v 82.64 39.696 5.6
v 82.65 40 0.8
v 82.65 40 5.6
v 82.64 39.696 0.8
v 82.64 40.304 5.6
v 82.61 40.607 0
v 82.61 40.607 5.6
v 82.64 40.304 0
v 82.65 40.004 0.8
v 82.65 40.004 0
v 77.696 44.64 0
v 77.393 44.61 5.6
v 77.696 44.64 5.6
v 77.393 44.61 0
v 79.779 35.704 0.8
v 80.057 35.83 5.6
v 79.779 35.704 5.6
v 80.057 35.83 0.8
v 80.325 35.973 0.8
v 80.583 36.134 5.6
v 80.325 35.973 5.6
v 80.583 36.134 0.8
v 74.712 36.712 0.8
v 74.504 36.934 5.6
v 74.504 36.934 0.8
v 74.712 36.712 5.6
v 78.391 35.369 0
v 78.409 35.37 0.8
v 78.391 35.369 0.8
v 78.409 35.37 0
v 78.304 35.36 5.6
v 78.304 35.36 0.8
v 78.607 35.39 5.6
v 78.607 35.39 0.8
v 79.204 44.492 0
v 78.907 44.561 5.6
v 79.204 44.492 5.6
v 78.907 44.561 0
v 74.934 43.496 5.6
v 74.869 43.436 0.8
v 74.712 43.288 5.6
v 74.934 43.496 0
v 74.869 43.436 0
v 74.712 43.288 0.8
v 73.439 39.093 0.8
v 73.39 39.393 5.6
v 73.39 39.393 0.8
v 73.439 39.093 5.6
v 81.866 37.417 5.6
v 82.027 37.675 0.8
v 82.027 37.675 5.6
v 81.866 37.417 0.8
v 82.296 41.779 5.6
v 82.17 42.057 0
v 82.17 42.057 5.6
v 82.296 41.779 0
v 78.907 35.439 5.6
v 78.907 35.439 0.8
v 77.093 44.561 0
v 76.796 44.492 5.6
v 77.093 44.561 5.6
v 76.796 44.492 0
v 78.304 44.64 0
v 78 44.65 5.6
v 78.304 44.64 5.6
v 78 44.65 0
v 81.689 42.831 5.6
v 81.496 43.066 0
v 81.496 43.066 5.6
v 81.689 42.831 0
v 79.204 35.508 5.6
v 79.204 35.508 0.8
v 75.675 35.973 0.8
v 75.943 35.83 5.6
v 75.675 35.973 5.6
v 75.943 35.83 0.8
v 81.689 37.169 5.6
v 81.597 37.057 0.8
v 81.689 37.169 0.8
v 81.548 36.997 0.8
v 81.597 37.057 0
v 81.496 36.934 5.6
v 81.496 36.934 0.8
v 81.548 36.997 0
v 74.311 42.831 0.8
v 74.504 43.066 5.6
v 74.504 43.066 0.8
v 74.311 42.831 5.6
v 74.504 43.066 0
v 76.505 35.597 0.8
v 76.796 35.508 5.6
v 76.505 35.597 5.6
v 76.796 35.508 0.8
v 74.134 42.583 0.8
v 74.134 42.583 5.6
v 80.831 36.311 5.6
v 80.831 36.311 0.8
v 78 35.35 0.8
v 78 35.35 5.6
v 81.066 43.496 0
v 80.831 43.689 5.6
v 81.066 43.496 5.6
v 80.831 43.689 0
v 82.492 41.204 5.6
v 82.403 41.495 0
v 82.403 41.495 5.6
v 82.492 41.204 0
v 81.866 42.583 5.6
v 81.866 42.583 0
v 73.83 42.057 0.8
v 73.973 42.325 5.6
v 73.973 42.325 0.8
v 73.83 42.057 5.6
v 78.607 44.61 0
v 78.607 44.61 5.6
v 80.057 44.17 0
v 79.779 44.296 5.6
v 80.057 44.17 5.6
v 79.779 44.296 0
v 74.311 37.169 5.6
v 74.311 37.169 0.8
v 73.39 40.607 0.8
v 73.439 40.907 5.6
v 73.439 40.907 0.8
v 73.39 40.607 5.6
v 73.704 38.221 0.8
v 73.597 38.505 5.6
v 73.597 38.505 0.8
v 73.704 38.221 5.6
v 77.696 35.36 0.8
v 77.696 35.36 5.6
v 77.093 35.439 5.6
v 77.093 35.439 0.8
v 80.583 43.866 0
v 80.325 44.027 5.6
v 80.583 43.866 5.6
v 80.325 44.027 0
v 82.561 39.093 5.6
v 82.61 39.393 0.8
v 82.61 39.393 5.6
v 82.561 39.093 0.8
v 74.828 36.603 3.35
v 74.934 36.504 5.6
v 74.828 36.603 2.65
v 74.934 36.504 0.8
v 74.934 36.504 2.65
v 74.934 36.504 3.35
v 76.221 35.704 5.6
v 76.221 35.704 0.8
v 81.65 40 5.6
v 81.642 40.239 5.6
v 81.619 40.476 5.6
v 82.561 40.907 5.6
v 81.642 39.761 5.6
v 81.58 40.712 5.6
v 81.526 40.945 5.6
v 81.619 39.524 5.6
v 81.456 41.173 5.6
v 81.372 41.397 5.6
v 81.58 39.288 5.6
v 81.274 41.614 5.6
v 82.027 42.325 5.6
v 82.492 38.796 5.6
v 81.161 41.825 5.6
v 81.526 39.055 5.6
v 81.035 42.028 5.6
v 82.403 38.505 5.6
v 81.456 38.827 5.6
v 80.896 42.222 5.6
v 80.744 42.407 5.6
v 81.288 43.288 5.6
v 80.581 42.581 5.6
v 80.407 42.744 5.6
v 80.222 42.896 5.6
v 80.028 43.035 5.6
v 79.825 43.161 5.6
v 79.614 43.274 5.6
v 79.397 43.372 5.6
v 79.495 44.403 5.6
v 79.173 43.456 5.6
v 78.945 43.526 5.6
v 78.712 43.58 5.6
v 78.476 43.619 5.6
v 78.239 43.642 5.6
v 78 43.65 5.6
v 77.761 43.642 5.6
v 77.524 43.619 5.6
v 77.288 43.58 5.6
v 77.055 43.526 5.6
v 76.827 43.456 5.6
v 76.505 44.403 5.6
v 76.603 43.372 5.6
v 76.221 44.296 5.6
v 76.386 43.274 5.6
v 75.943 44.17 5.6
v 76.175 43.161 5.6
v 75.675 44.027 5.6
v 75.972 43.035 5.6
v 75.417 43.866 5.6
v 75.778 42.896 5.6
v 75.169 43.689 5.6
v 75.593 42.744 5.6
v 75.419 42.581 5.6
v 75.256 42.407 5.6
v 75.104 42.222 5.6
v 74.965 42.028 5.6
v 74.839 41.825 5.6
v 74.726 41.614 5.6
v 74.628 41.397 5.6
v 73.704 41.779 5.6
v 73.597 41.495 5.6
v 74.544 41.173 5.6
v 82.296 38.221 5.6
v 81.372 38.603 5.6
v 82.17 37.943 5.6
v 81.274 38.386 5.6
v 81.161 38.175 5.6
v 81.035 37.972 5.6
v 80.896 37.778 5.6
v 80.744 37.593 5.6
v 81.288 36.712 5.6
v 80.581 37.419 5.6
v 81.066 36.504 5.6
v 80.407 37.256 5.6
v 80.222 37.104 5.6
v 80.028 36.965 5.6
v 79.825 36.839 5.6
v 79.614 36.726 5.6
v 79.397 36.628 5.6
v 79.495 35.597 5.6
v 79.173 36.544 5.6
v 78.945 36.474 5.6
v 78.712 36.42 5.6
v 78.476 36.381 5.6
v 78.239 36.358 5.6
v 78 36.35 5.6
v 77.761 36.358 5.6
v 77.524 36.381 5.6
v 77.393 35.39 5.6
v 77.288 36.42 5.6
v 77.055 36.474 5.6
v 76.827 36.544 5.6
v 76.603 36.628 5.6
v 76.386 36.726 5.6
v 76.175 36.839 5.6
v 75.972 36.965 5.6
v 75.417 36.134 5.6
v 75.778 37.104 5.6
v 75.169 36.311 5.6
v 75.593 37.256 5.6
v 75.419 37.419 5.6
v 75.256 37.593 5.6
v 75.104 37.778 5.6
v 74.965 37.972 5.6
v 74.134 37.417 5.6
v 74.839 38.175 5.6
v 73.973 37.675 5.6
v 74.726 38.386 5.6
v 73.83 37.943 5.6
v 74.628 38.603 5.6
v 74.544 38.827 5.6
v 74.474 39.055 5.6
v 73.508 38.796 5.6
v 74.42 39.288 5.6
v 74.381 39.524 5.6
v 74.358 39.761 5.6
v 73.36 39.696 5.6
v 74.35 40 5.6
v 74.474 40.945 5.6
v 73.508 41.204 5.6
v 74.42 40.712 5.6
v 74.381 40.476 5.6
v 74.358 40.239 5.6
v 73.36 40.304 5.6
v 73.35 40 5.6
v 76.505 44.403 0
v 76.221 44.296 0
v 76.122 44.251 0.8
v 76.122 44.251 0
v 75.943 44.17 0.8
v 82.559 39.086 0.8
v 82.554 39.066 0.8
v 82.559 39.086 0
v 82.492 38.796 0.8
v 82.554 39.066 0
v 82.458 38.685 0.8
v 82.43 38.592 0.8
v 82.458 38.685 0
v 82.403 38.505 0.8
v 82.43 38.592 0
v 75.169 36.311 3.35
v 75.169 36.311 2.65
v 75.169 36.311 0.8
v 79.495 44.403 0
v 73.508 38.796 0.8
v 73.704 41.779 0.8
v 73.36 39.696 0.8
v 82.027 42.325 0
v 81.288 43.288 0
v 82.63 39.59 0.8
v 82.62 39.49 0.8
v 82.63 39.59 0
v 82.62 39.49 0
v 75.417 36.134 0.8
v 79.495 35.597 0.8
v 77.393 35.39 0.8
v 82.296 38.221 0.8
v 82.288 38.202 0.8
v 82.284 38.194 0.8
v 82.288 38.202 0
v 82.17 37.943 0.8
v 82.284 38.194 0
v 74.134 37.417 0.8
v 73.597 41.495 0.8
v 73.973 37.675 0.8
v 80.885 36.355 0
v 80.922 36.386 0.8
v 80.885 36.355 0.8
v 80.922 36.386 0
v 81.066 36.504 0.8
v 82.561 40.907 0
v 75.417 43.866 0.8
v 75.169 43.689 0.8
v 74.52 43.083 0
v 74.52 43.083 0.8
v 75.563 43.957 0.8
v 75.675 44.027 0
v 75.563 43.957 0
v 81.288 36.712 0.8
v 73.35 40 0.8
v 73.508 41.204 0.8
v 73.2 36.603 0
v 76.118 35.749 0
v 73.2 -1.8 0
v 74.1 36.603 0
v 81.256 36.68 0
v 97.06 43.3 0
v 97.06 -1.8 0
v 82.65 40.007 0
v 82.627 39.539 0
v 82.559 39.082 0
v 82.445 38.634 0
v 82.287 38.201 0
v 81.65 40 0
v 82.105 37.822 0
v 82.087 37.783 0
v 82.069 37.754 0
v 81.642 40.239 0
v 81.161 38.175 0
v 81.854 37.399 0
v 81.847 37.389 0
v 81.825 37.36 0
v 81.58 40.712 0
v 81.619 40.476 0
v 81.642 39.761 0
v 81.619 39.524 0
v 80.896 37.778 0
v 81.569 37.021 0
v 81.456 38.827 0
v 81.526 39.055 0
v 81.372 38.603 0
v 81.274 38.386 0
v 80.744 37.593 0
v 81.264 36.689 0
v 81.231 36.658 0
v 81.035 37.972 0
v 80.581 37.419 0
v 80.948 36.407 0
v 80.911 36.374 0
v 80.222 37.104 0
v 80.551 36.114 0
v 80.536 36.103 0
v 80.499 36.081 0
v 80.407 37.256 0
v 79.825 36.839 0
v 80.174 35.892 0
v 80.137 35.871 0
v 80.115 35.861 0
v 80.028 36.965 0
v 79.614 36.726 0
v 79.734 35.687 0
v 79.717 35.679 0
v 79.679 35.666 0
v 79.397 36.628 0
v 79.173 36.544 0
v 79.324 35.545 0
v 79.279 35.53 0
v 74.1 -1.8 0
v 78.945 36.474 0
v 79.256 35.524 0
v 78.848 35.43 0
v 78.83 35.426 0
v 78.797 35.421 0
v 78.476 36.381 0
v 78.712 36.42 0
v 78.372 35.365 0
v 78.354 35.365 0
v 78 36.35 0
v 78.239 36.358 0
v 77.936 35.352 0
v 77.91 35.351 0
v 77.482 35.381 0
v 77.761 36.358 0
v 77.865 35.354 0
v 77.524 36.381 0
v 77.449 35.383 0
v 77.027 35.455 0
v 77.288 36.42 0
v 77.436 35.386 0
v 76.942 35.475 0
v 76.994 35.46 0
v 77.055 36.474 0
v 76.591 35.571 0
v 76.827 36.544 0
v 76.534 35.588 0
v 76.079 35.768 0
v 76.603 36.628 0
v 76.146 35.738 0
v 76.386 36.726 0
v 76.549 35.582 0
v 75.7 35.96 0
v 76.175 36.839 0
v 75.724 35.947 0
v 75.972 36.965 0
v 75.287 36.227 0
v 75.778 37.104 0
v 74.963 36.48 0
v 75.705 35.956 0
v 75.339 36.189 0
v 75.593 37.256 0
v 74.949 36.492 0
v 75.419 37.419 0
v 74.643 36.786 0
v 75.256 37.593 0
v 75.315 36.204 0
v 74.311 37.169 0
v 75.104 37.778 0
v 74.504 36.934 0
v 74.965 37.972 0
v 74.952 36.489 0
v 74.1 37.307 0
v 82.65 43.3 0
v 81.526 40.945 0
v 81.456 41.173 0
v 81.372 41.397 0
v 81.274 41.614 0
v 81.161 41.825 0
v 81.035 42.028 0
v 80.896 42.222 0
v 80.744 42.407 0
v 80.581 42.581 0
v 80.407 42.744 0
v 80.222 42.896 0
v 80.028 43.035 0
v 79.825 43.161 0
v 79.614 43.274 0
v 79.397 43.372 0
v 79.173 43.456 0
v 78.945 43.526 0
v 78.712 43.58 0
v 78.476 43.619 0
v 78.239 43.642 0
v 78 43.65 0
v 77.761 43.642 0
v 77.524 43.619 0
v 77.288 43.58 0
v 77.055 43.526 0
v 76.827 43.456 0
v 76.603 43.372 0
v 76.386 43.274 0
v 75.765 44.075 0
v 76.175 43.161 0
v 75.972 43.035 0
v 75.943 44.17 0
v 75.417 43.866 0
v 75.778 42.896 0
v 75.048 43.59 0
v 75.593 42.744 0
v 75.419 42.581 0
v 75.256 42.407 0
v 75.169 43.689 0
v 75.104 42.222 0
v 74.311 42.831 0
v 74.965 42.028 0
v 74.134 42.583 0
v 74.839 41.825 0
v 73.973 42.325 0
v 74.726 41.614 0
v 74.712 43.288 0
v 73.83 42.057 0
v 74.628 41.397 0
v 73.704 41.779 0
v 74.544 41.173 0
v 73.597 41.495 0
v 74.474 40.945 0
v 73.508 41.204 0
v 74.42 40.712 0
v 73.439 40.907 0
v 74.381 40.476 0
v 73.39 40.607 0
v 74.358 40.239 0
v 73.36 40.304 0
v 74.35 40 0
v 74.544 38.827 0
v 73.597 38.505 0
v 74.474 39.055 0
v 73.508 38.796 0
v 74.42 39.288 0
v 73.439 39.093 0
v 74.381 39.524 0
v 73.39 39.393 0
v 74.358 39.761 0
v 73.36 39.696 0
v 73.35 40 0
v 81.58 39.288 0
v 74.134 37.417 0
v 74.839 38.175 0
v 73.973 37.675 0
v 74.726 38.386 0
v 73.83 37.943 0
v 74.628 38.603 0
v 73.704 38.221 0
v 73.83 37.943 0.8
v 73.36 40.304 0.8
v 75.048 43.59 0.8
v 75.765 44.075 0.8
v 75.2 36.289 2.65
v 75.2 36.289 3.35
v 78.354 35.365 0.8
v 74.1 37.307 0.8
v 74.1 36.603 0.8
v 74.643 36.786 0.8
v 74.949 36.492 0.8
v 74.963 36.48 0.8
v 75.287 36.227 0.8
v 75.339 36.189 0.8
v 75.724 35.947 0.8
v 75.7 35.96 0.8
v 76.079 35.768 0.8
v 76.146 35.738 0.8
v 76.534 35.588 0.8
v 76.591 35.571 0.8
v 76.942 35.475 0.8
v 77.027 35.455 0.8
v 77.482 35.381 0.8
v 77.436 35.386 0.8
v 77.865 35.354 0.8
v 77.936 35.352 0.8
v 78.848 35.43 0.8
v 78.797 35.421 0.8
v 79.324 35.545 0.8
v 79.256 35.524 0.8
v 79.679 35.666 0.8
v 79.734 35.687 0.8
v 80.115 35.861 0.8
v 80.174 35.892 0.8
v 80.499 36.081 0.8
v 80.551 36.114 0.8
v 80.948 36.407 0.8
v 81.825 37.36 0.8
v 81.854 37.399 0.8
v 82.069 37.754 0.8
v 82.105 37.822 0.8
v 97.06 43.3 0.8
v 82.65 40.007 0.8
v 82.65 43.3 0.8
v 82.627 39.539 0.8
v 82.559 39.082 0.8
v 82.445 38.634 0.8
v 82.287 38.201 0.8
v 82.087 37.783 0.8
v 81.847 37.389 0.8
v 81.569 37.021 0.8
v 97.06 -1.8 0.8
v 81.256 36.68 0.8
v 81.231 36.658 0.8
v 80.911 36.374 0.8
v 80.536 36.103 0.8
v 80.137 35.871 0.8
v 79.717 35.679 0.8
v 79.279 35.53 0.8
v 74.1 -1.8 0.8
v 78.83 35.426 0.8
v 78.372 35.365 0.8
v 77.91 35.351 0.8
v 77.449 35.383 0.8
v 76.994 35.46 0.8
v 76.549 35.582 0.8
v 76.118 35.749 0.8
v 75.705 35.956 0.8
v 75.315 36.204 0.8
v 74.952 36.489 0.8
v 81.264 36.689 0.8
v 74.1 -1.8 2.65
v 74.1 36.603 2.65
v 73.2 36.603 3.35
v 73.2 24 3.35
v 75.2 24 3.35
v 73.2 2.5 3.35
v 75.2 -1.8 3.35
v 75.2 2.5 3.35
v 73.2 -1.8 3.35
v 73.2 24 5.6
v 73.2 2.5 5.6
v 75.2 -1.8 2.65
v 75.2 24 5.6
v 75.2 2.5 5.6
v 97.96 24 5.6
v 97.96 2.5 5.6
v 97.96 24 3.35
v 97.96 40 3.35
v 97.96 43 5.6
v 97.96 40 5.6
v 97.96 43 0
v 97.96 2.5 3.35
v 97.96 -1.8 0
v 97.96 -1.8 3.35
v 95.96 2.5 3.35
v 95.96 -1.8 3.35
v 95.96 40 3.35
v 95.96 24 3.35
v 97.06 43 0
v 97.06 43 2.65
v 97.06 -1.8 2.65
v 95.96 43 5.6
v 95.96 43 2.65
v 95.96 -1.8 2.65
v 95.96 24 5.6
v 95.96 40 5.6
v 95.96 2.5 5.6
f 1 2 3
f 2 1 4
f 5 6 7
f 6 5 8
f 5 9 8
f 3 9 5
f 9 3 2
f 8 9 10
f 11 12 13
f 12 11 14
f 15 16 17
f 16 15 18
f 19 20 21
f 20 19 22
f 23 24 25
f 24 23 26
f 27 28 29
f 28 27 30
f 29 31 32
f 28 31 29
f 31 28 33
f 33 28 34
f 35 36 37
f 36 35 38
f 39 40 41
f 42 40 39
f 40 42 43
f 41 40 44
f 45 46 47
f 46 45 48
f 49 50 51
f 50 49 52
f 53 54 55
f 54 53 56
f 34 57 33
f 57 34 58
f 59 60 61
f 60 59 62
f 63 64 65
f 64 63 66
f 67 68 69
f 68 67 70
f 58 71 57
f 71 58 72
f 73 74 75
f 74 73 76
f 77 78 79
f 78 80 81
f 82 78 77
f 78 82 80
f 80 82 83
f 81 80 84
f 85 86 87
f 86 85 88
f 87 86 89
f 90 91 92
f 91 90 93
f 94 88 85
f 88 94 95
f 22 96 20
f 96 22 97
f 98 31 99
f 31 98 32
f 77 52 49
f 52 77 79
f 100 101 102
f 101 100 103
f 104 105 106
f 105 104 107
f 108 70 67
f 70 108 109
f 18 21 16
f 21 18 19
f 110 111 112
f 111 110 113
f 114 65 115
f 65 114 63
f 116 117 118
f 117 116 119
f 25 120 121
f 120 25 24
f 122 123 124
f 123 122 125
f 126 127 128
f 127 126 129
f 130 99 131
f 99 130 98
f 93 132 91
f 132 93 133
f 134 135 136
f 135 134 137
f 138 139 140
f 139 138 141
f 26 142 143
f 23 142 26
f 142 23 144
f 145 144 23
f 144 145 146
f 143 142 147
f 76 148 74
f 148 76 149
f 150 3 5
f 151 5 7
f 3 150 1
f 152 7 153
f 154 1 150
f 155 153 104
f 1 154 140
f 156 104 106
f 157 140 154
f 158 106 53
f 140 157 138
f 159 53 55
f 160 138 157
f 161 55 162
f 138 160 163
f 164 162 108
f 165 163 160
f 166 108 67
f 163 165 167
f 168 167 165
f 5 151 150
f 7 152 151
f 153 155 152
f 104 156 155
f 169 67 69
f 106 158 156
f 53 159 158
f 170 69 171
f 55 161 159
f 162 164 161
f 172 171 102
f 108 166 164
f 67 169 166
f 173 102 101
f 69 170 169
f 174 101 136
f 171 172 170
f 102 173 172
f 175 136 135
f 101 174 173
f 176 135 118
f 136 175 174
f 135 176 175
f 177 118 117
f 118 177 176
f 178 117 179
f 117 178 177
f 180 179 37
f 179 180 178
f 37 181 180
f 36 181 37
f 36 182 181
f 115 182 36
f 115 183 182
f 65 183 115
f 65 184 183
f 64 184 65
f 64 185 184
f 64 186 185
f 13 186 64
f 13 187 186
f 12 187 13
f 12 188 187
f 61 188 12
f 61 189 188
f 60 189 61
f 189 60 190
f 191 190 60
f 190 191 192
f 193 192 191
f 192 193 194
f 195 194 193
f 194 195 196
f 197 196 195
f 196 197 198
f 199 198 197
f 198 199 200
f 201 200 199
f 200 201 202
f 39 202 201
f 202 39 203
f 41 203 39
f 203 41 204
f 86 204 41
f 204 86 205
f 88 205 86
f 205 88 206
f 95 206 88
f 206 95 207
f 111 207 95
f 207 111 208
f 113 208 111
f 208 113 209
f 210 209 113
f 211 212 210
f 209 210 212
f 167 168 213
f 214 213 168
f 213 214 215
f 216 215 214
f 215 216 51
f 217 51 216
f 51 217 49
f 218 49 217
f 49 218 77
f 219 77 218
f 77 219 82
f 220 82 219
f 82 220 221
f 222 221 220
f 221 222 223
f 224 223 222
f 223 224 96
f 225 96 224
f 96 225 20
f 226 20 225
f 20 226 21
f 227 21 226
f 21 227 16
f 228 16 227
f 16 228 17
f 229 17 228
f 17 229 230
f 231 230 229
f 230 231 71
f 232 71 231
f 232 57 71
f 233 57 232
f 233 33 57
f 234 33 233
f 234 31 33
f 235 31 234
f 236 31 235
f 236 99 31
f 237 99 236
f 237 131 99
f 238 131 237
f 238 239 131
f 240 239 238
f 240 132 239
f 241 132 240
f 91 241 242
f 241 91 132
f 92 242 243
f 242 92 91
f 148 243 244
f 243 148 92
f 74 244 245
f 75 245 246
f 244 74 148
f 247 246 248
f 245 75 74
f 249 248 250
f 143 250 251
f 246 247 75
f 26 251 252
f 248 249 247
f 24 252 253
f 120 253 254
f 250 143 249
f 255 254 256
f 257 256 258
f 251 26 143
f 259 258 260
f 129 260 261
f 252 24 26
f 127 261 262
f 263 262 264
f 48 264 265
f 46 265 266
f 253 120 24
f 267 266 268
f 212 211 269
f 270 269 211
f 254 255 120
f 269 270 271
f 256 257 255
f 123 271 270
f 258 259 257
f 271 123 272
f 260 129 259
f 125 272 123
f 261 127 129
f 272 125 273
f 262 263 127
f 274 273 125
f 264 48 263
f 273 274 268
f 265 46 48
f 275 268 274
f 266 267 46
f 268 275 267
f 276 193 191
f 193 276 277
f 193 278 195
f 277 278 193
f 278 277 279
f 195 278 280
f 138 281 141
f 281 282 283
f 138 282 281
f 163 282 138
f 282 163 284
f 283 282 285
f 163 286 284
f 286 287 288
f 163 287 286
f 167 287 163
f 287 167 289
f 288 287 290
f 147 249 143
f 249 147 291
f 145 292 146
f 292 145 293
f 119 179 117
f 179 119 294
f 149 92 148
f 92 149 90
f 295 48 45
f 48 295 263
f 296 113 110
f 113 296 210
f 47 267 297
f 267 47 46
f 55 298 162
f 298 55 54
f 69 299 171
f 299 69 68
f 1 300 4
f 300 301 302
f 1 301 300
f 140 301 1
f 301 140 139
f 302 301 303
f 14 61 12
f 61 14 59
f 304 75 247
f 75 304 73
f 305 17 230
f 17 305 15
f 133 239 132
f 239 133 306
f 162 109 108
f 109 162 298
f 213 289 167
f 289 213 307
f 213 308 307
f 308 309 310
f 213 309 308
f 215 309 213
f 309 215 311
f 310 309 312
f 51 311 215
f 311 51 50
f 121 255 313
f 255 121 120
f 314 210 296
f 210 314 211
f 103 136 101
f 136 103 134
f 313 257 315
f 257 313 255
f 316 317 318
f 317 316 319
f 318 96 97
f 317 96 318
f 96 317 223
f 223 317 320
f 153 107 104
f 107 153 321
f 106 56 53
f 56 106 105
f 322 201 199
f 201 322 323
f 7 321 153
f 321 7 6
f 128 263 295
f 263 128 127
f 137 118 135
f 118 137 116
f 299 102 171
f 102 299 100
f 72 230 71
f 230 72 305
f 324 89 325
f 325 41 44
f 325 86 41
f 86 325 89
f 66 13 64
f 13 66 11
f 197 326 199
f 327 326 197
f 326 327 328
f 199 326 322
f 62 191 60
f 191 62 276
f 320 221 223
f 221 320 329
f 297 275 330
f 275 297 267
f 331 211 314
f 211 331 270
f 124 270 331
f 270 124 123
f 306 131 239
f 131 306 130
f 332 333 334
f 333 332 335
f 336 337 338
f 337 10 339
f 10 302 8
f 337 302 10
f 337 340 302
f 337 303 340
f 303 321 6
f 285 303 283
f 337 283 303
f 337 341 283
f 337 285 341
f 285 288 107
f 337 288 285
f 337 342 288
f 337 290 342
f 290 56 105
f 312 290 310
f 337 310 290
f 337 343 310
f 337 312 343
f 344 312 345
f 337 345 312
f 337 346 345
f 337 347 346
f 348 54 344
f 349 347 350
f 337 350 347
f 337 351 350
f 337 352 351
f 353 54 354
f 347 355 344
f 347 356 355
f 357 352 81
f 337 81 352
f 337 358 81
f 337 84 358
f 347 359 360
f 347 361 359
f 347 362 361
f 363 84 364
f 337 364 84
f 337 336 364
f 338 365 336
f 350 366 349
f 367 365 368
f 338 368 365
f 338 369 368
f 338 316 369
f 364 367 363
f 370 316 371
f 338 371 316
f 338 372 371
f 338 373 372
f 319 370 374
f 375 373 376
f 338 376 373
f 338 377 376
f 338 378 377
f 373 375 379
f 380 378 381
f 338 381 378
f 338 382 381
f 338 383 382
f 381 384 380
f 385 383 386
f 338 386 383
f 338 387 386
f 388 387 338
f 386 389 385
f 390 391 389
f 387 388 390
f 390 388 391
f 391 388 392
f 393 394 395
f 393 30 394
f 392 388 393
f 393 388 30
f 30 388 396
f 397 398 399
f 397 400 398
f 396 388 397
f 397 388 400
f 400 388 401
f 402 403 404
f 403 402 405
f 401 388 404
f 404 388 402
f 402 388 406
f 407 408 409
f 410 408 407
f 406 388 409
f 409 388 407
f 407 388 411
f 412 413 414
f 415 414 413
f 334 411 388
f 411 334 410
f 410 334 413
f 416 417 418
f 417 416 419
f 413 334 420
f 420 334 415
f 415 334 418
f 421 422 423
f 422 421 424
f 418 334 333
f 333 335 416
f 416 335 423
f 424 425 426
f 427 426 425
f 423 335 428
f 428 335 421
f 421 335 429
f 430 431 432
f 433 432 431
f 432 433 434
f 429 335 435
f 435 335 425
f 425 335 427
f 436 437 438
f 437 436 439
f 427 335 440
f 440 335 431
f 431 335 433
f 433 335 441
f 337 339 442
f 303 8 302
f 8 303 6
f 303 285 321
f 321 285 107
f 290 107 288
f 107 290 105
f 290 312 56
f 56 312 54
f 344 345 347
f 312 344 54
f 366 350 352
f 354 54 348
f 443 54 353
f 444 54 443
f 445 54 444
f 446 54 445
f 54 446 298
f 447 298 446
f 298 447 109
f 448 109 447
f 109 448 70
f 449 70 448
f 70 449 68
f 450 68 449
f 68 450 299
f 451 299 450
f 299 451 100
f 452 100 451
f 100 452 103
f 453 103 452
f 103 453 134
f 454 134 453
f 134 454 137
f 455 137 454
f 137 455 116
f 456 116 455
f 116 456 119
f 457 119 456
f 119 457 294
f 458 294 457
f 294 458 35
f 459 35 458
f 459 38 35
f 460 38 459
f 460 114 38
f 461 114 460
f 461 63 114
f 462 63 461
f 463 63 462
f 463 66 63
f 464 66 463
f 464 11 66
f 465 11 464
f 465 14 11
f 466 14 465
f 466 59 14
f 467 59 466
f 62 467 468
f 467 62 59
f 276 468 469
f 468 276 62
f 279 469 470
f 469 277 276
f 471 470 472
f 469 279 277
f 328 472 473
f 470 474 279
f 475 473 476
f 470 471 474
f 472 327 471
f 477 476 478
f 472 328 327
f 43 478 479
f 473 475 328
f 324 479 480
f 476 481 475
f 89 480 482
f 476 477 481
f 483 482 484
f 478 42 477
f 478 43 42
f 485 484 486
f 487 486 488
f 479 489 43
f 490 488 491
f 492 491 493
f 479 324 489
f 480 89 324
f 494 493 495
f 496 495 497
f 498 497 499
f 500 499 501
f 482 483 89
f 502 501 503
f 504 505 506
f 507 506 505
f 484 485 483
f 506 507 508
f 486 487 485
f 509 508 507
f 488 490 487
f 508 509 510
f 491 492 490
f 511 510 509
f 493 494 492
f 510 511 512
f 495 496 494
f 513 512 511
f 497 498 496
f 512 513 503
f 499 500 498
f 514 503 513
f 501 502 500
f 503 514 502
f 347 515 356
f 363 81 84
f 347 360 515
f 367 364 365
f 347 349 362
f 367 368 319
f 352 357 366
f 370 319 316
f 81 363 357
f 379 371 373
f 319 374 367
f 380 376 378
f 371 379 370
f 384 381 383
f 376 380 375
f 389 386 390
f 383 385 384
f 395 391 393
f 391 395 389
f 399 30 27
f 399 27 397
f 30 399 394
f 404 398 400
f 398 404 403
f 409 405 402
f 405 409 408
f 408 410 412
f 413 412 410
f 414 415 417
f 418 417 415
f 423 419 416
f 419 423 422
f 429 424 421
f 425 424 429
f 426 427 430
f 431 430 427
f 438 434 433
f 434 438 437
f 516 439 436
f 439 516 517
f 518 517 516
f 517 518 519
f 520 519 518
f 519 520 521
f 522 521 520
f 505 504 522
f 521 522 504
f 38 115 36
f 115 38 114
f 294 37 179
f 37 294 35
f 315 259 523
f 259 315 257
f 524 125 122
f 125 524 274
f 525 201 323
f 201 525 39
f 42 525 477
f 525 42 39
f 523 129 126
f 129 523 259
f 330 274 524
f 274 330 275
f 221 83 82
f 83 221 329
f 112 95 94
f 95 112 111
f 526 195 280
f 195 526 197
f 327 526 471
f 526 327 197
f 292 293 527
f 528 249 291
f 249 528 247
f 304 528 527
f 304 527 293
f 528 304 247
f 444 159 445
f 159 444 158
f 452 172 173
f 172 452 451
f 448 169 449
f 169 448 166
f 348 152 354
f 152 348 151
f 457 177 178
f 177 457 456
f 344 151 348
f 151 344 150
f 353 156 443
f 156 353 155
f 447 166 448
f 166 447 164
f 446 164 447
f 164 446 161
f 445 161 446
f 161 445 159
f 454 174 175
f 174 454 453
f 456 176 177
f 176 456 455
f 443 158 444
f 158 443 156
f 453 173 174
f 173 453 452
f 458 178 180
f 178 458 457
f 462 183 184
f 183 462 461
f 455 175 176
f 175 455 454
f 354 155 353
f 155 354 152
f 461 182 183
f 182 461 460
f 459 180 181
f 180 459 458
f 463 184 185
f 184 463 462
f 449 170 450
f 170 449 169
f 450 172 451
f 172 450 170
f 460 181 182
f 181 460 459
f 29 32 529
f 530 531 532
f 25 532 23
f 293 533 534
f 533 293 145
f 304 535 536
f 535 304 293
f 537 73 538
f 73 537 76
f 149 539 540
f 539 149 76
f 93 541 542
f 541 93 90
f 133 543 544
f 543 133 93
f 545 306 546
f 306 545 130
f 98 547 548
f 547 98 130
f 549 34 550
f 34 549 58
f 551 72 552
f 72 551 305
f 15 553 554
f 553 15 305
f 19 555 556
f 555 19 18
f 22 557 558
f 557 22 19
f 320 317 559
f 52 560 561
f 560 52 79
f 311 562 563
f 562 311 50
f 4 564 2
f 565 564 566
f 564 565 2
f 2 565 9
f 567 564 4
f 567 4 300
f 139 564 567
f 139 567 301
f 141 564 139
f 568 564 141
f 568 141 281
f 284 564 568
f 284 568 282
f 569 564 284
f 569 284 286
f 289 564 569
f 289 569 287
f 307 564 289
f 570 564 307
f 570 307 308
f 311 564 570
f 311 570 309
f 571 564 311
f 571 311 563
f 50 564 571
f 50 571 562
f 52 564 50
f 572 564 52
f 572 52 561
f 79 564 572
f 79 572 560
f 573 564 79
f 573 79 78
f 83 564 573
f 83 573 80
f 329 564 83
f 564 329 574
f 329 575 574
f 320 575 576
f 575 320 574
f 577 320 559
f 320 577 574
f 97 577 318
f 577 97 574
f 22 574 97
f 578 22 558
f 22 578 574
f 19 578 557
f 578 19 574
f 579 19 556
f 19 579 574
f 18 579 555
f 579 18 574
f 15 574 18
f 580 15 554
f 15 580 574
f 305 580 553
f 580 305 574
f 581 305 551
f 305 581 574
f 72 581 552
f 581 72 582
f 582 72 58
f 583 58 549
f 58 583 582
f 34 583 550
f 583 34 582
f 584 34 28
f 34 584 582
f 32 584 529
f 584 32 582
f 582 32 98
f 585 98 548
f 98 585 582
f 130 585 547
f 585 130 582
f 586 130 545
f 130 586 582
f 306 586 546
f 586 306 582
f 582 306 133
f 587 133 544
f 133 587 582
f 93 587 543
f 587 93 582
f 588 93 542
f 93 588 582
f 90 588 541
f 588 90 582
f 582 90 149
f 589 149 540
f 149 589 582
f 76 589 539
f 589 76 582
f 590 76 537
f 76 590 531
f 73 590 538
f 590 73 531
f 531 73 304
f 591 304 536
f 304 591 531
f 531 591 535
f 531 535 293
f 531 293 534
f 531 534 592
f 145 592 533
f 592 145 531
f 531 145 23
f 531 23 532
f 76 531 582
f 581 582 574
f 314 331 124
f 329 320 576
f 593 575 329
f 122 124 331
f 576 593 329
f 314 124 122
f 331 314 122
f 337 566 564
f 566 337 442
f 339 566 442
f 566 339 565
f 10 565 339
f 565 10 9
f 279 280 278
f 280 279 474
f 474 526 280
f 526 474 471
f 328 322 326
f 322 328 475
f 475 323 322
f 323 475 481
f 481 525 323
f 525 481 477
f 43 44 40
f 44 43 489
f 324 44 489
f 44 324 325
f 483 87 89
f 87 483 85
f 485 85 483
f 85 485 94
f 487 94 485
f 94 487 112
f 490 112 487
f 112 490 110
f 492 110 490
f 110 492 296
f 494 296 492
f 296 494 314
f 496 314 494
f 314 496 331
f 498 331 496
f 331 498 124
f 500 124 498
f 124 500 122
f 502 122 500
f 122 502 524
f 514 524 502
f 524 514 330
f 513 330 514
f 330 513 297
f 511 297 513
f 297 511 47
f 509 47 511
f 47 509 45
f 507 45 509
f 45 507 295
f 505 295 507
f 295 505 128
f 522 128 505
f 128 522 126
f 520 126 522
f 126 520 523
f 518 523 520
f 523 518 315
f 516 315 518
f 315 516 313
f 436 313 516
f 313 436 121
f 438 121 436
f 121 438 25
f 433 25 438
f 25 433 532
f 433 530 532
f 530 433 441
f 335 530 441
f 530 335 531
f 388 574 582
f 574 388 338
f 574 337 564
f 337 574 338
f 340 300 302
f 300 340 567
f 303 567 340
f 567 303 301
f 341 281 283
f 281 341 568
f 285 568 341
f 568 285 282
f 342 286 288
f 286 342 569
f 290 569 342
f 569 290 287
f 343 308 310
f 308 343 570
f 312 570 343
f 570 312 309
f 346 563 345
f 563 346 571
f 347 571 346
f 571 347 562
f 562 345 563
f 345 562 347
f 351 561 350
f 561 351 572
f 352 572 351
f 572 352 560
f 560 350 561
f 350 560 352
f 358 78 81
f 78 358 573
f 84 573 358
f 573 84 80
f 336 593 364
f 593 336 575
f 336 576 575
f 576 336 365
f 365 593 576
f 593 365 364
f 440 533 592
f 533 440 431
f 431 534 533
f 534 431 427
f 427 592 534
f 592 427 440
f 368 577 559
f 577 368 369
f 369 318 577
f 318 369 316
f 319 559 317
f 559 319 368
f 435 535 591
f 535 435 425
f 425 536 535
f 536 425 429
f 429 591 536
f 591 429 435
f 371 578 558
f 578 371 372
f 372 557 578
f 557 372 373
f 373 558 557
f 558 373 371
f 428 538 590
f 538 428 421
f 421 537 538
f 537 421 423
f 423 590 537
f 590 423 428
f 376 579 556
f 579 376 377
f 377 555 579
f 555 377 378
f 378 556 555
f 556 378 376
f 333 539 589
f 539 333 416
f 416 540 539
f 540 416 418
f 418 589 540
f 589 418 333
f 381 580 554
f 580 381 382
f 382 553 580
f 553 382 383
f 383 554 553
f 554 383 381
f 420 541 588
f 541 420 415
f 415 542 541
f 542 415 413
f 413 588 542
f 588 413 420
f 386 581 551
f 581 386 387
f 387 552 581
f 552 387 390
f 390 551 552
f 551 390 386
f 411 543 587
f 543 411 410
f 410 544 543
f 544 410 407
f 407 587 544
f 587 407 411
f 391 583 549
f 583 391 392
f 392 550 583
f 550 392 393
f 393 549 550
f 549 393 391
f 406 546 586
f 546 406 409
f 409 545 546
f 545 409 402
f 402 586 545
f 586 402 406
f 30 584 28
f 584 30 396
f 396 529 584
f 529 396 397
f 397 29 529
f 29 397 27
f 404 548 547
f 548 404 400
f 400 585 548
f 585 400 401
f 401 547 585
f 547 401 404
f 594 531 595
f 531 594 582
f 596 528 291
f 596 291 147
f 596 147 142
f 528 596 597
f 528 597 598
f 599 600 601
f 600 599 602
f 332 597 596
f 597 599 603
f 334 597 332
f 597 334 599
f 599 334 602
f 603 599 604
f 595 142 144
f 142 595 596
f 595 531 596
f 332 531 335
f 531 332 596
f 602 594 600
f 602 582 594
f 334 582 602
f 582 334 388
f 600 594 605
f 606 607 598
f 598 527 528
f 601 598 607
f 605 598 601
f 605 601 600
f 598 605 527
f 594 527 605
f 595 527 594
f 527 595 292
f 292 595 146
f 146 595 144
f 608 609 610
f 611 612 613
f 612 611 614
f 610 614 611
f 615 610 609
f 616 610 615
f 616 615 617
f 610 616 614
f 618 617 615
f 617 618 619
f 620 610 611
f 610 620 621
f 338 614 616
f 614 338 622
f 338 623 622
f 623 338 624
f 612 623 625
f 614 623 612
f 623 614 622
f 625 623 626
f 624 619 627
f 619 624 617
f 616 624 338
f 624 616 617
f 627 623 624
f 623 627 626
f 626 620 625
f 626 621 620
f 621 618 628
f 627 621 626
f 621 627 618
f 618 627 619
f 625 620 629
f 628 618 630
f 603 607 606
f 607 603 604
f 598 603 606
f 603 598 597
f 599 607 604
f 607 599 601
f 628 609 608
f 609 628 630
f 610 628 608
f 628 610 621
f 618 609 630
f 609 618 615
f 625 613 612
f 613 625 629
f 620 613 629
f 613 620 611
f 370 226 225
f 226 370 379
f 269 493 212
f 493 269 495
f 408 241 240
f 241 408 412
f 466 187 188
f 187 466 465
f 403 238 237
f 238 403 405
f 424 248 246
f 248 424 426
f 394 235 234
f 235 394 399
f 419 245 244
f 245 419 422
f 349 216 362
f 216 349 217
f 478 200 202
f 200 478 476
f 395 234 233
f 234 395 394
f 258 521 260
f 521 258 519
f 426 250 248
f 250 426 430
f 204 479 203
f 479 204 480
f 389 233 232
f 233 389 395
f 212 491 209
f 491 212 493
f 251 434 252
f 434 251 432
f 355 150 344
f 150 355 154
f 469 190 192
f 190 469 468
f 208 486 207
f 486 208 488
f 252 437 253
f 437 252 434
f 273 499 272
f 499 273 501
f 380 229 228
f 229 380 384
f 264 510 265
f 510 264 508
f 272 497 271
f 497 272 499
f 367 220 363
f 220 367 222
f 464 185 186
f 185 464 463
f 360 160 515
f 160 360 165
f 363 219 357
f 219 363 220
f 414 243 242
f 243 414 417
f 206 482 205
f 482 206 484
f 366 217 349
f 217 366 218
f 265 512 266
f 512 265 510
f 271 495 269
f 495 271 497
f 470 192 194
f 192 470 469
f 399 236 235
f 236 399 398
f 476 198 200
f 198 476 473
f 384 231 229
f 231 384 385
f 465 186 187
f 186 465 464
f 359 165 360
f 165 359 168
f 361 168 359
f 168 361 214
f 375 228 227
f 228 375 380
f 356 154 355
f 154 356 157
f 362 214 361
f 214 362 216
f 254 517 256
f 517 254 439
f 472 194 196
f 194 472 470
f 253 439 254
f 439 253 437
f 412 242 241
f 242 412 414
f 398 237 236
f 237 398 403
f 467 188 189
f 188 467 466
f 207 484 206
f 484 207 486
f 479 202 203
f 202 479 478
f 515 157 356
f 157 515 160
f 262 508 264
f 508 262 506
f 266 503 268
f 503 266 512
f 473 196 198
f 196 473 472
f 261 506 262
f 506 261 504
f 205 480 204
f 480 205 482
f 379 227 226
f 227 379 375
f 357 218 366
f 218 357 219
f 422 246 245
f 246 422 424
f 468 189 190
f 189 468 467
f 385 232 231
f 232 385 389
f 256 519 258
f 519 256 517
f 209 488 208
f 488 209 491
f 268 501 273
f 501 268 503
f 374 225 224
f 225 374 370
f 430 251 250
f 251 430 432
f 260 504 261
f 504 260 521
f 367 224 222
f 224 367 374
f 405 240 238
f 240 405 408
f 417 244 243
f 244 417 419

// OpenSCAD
// generated by make_tray.py: the SD board's tray (u, v in mm from the FM-1 board's left and bottom edges)
$fn = 96;
difference() { union() {
  linear_extrude(0.8) union() { offset(delta=0.3) polygon([[96.76, -1.5], [74.4, -1.5], [74.4, 36.603], [74.755, 36.262], [75.142, 35.959], [75.557, 35.695], [75.996, 35.474], [76.455, 35.297], [76.929, 35.167], [77.414, 35.085], [77.904, 35.051], [78.396, 35.066], [78.884, 35.13], [79.362, 35.241], [79.828, 35.4], [80.275, 35.604], [80.7, 35.851], [81.099, 36.14], [81.466, 36.466], [81.8, 36.828], [82.096, 37.22], [82.351, 37.64], [82.564, 38.084], [82.732, 38.546], [82.853, 39.023], [82.926, 39.509], [82.95, 40.0], [82.95, 43.0], [96.76, 43.0]]);
    translate([78.0, 40.0]) circle(r=4.65); }
  translate([73.200, -1.800, 0.000]) cube([0.900, 38.403, 3.350]);   // the left rail
  translate([73.200, -1.800, 2.650]) cube([2.000, 38.403, 0.700]);   // its lip
  translate([97.060, -1.800, 0.000]) cube([0.900, 44.800, 3.350]);   // the right rail
  translate([95.960, -1.800, 2.650]) cube([2.000, 44.800, 0.700]);   // its lip
  translate([73.200, 2.500, 2.650]) cube([2.000, 21.500, 2.950]);   // a post
  translate([95.960, 2.500, 2.650]) cube([2.000, 21.500, 2.950]);   // a post
  translate([95.960, 40.000, 2.650]) cube([2.000, 3.000, 2.950]);   // a post
  translate([78.0, 40.0, 0]) difference() { cylinder(r=4.65, h=5.6); translate([0, 0, -1]) cylinder(r=3.6500000000000004, h=7.6); }   // the collar
}
  translate([78.0, 40.0, -1]) cylinder(r=3.6500000000000004, h=7.6);
}
